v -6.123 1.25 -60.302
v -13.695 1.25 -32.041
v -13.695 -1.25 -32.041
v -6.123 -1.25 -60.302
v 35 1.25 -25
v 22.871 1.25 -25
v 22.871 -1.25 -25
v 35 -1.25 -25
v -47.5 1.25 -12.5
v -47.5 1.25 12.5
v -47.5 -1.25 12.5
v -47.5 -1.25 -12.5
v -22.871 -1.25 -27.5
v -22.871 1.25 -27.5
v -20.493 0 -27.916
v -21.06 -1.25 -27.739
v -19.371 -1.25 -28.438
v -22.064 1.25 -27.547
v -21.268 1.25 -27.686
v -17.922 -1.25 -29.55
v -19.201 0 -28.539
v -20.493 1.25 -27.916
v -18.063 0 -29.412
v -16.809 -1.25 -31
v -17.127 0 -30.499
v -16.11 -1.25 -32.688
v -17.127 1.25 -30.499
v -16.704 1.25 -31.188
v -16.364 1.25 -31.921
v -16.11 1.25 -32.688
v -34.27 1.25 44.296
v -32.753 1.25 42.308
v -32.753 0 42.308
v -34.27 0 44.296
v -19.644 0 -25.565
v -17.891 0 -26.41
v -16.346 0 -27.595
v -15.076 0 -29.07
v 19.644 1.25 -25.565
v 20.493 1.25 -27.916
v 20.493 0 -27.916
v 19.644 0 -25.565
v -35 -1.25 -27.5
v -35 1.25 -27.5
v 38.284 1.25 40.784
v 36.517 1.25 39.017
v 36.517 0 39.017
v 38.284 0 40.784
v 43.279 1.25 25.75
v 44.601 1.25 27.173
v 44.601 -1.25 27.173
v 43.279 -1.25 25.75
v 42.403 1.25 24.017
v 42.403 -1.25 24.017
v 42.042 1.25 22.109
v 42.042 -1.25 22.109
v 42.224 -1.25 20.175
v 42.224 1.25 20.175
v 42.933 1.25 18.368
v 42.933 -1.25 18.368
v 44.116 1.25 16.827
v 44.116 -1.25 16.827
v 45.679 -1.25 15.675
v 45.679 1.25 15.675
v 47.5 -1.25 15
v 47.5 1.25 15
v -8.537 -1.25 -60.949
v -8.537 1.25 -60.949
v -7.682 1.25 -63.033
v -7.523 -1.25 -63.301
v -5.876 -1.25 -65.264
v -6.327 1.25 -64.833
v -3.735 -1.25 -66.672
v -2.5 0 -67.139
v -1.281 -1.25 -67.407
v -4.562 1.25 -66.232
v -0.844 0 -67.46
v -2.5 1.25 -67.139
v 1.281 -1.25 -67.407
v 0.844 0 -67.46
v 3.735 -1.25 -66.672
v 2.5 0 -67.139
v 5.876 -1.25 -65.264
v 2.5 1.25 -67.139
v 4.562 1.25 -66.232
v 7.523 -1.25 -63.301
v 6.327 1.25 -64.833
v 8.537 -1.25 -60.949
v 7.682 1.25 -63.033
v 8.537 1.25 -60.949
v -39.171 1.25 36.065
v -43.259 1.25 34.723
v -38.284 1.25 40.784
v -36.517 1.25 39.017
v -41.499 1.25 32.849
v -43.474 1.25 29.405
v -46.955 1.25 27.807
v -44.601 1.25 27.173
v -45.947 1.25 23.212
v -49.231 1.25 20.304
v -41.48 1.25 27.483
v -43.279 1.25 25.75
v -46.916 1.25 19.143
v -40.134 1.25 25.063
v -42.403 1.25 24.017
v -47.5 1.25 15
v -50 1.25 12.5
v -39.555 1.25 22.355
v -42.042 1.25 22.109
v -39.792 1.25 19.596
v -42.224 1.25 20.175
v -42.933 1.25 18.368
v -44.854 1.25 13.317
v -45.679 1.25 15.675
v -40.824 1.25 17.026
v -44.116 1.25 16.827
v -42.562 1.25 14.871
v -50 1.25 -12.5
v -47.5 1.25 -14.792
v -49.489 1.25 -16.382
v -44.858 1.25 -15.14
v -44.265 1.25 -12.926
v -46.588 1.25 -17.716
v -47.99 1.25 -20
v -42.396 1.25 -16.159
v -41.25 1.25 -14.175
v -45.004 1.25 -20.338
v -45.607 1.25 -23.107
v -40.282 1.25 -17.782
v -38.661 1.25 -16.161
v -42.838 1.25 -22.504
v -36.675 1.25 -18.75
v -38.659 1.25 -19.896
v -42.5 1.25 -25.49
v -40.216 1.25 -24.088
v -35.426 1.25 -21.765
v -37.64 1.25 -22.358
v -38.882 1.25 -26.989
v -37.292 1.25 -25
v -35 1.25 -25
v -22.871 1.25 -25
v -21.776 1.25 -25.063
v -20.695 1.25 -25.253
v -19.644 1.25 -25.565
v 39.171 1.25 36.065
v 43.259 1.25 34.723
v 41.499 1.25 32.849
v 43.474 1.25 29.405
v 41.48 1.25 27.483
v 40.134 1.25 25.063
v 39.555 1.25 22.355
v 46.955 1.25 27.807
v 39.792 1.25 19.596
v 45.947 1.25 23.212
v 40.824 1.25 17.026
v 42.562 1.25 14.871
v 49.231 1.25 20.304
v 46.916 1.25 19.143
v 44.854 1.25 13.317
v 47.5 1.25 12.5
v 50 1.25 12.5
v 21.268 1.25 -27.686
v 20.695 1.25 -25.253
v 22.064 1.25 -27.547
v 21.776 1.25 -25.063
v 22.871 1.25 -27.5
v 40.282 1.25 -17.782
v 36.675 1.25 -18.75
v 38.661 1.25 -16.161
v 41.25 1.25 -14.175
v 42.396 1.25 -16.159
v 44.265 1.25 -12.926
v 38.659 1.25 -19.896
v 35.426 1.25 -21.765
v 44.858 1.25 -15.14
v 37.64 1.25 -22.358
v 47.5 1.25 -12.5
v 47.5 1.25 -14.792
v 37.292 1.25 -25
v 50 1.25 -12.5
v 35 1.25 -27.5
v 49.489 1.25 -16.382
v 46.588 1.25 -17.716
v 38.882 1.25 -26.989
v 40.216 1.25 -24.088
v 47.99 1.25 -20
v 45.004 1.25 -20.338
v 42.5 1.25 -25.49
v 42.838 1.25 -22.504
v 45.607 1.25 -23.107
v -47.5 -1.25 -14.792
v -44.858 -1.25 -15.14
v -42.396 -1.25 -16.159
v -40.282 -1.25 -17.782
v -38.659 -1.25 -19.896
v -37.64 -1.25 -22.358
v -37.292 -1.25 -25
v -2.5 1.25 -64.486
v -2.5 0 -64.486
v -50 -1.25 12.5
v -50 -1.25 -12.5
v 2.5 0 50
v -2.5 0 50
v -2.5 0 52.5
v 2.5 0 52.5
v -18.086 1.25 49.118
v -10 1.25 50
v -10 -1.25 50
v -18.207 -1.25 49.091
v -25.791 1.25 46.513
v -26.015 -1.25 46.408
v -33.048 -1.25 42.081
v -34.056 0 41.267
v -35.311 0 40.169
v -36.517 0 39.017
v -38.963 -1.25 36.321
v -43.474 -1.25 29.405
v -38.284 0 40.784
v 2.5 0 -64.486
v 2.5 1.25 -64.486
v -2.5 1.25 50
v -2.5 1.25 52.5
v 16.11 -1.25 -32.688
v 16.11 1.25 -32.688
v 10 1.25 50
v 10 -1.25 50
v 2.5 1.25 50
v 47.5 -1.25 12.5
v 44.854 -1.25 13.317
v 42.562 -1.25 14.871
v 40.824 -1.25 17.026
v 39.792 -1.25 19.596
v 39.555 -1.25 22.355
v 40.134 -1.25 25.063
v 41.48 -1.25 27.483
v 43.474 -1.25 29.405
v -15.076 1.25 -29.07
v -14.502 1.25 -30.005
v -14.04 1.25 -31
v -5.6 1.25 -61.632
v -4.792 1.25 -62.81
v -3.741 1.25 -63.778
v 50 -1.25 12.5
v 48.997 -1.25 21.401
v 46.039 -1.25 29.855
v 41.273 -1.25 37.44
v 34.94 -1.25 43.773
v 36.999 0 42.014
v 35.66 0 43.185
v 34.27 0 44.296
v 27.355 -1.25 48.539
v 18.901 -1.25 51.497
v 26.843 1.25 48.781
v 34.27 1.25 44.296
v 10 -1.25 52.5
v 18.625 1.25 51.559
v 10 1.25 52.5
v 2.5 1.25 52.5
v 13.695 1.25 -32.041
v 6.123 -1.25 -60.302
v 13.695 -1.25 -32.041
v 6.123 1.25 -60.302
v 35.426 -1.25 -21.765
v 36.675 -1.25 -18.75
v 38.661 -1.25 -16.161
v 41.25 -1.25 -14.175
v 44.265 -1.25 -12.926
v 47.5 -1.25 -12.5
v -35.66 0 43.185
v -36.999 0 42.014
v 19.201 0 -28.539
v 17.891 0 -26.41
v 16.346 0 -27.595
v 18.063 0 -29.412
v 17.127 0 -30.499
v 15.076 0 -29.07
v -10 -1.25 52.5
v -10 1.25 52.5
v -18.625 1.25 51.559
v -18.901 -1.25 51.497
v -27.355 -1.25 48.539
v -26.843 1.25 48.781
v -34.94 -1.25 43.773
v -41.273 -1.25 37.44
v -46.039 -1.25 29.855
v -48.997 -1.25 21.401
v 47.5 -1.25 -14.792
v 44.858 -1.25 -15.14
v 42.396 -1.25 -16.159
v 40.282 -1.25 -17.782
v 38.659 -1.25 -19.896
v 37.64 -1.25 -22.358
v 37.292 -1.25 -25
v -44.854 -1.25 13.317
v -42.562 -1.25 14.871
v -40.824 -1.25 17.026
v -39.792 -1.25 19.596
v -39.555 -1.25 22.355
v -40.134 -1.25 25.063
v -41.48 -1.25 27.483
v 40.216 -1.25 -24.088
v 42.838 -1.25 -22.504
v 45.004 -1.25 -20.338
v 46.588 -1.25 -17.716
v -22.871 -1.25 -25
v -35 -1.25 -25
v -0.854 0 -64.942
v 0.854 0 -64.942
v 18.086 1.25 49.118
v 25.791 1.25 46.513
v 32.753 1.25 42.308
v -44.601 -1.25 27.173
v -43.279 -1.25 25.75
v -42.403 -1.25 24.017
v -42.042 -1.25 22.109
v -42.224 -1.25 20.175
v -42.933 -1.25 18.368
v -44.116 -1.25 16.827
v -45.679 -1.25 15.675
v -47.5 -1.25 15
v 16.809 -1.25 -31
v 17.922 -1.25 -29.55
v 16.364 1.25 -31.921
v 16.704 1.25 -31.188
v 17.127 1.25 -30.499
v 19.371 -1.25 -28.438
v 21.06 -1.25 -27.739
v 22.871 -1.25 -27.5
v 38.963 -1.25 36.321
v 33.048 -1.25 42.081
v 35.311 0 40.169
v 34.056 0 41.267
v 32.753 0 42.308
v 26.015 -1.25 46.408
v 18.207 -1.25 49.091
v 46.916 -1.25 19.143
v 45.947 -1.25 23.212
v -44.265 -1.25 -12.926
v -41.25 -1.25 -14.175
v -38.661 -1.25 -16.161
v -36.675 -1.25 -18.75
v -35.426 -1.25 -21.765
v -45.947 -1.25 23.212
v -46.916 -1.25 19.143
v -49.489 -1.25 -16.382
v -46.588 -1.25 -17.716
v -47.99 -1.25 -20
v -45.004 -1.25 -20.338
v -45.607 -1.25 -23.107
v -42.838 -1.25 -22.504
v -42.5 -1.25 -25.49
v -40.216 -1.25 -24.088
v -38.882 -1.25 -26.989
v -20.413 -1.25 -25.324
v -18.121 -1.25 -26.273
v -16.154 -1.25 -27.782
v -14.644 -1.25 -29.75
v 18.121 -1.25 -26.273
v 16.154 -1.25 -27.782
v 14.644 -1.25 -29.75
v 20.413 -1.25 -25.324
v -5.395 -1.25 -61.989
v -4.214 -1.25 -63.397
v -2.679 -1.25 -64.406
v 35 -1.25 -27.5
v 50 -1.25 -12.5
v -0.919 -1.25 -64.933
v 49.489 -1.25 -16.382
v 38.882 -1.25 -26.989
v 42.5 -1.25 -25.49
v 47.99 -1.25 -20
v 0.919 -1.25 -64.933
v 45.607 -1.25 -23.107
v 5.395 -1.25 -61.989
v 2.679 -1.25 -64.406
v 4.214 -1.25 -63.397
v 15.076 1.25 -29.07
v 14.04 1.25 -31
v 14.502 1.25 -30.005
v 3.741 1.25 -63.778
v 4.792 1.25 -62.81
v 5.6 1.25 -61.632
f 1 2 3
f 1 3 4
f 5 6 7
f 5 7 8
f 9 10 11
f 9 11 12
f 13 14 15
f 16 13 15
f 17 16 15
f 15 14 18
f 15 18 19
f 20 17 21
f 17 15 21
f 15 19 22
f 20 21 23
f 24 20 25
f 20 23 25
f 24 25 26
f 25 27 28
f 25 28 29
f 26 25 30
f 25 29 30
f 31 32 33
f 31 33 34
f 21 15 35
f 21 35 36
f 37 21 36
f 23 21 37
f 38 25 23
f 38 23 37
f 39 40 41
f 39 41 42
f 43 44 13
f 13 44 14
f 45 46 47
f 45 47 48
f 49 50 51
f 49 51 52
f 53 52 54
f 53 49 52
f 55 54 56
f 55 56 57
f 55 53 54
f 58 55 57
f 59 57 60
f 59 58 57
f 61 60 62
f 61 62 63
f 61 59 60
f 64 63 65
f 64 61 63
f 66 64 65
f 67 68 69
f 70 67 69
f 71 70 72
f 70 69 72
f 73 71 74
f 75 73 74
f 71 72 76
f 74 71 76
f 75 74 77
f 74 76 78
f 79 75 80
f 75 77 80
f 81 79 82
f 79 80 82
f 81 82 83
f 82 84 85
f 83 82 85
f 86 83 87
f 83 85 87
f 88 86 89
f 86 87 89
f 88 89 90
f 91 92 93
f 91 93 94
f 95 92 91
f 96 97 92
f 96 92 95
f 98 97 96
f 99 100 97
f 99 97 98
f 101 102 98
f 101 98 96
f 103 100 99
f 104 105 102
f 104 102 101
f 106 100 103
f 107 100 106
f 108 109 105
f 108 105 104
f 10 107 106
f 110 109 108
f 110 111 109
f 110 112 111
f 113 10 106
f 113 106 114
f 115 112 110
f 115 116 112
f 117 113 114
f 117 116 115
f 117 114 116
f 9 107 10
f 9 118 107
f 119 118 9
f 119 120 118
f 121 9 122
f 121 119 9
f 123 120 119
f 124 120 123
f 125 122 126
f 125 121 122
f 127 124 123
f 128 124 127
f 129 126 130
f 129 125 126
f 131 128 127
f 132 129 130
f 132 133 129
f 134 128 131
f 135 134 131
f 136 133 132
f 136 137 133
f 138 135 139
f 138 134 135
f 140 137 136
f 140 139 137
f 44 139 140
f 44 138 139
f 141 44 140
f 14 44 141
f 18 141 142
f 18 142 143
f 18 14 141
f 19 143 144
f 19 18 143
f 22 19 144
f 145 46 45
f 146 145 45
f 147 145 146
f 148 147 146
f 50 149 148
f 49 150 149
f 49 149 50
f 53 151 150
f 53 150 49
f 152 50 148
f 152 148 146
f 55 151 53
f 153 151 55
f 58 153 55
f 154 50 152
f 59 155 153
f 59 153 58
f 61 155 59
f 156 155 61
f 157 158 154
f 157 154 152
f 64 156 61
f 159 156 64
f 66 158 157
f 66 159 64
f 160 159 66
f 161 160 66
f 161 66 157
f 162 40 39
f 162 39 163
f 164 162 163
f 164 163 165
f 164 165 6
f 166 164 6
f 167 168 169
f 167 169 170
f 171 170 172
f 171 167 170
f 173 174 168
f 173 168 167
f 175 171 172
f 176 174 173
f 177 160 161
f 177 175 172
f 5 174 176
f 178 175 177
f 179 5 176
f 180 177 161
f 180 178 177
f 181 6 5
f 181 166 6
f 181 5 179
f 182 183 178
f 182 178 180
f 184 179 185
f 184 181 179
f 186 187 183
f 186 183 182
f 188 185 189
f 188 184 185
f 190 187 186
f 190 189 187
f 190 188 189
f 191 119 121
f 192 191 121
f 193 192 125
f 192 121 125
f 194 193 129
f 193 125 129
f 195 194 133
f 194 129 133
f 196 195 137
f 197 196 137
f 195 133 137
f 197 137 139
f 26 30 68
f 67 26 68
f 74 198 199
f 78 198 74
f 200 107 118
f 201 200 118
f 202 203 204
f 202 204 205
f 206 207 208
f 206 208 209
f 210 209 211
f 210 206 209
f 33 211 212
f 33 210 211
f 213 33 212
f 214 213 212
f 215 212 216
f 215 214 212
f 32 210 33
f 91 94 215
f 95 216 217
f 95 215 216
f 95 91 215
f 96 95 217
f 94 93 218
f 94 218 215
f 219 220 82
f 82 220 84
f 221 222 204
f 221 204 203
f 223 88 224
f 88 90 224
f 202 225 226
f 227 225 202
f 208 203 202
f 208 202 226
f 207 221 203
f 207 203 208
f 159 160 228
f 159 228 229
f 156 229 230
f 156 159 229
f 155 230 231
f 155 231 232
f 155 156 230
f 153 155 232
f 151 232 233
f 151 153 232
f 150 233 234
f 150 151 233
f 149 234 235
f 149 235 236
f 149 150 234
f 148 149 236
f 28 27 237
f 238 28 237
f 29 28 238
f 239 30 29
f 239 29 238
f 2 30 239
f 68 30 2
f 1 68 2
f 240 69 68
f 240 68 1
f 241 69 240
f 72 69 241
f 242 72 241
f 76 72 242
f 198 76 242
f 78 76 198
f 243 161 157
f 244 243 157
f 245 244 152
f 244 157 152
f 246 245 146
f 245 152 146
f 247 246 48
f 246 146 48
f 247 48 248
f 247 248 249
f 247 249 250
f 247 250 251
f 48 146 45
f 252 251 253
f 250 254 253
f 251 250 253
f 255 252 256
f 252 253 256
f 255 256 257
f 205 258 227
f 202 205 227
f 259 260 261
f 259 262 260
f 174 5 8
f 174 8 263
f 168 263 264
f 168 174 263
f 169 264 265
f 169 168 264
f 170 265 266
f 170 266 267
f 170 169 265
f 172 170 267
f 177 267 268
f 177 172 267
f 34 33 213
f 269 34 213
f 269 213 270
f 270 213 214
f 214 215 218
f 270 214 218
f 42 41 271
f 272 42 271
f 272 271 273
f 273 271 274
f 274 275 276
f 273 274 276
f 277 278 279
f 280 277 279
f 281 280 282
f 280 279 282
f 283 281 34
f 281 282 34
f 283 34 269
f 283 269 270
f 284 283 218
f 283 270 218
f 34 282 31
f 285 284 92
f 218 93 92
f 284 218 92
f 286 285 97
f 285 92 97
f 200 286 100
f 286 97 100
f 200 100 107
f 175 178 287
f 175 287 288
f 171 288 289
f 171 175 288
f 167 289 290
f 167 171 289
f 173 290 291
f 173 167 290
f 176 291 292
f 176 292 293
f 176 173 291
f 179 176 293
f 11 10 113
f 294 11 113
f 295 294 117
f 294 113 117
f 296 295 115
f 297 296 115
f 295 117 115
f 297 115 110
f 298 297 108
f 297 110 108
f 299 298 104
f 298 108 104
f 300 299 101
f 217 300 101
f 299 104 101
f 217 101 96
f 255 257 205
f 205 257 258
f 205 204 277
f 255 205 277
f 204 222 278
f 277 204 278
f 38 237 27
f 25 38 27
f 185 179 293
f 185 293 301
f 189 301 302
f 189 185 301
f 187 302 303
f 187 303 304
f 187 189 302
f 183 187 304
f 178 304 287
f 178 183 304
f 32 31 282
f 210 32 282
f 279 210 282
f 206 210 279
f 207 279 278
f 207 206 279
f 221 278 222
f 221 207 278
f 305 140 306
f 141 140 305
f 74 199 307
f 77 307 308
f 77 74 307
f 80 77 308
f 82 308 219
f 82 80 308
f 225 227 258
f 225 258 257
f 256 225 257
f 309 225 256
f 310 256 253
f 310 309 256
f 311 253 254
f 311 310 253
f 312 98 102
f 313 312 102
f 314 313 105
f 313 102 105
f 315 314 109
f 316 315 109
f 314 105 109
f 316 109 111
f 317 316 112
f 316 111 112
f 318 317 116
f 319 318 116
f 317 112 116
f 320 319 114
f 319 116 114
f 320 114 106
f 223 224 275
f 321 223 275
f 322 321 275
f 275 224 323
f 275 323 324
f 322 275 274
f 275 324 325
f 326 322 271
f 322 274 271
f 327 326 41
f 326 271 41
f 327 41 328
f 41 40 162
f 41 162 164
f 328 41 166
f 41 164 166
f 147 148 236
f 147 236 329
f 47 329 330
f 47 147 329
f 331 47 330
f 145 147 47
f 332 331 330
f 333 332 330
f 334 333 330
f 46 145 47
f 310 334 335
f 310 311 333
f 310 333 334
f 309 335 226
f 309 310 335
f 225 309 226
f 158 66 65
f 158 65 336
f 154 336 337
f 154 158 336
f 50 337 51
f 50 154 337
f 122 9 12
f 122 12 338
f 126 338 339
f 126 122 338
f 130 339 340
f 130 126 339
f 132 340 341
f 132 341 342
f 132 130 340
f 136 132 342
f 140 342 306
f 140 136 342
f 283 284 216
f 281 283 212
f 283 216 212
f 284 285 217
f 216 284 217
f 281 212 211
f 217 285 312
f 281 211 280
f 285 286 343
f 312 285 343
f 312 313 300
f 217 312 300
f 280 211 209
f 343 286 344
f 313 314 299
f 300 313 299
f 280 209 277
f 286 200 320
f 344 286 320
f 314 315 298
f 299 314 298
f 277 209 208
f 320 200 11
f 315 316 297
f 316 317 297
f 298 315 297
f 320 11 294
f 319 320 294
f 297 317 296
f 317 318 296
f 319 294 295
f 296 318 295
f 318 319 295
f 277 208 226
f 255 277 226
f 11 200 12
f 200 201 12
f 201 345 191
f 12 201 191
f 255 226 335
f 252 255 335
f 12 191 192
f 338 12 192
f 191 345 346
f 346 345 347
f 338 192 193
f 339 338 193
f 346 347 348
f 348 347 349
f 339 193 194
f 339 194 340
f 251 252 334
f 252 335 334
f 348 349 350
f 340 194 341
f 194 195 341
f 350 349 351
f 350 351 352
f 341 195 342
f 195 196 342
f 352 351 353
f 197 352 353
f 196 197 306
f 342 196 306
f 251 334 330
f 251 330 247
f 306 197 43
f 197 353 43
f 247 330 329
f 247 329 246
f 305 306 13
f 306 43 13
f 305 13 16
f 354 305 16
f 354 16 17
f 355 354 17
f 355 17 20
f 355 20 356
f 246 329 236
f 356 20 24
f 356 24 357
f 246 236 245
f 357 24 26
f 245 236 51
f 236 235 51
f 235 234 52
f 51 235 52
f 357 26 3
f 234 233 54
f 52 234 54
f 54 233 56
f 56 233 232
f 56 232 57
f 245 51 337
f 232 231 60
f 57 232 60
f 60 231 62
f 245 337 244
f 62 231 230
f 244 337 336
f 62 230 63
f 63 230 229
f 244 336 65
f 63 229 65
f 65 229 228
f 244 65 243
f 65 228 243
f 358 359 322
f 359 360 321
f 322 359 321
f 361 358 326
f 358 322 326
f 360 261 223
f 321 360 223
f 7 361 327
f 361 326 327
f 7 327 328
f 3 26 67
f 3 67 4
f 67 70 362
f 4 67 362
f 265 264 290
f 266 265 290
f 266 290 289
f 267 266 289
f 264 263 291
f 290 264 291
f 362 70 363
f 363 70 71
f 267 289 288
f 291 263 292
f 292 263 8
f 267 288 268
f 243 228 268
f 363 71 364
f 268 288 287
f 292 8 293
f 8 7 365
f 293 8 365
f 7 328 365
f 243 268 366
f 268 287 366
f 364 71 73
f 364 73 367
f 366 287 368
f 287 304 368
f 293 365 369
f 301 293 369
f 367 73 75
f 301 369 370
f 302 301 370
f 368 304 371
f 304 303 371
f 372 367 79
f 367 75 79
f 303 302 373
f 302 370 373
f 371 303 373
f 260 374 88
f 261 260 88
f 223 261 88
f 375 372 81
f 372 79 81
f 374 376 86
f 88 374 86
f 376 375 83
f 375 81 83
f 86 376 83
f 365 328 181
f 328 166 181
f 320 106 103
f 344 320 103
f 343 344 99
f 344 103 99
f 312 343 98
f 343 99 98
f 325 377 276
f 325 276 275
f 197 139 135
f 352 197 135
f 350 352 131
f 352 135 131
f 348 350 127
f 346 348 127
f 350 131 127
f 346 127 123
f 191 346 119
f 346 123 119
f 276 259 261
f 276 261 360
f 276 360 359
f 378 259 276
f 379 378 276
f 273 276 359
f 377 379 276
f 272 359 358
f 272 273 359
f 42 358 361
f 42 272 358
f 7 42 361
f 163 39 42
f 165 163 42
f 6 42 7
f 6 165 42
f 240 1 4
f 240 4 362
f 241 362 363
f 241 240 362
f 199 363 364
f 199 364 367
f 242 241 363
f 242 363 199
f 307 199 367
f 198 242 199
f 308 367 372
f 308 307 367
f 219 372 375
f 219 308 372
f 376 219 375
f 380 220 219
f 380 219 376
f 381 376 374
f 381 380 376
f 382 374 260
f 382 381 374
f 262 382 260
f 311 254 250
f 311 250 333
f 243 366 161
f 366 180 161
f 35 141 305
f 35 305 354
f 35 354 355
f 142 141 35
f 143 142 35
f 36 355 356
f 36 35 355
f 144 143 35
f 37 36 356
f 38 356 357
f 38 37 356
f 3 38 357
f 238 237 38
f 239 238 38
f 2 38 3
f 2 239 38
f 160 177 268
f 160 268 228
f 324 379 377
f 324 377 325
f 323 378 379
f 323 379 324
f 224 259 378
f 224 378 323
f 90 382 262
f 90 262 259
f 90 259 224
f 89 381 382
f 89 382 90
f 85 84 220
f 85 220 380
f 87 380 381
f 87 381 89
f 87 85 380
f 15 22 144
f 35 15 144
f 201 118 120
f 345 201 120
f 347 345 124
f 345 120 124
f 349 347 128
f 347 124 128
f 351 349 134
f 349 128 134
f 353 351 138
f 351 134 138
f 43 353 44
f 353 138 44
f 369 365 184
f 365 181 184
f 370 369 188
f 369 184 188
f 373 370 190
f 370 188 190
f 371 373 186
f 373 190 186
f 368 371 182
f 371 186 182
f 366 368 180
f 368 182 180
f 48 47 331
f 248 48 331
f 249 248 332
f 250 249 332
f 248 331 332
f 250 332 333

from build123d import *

# Parameters (mm, degrees)
BOSS_EXTRUDE1_DEPTH = 1.25
BOSS_EXTRUDE5_DEPTH = 2.5
SKETCH6_W           = 5
SKETCH6_H           = 4
CUT_EXTRUDE1_DEPTH  = 1.25
CUT_EXTRUDE2_DEPTH  = 2.5


with BuildPart() as part:
    # Sketch2 → Boss-Extrude1 (new body, symmetric)
    with BuildSketch(Plane(origin=(0, 0, 0), x_dir=(1, 0, 0), z_dir=(0, 1, 0))):
        with BuildLine():
            Line((-16.109808132, 32.688266684), (-8.537351427, 60.949059844))
            ThreePointArc((-8.537351427, 60.949059844), (0, 67.5), (8.537351427, 60.949059844))
            Line((8.537351427, 60.949059844), (16.109808132, 32.688266684))
            ThreePointArc((16.109808132, 32.688266684), (18.609958913, 28.946526618), (22.871288916, 27.5))
            Line((22.871288916, 27.5), (35, 27.5))
            ThreePointArc((35, 27.5), (45.606601718, 23.106601718), (50, 12.5))
            Line((50, 12.5), (50, -12.5))
            ThreePointArc((50, -12.5), (38.284271247, -40.784271247), (10, -52.5))
            Line((10, -52.5), (-10, -52.5))
            ThreePointArc((-10, -52.5), (-38.284271247, -40.784271247), (-50, -12.5))
            Line((-50, -12.5), (-50, 12.5))
            ThreePointArc((-50, 12.5), (-45.606601718, 23.106601718), (-35, 27.5))
            Line((-35, 27.5), (-22.871288916, 27.5))
            ThreePointArc((-22.871288916, 27.5), (-18.609958913, 28.946526618), (-16.109808132, 32.688266684))
        make_face()
        with BuildLine():
            Line((6.122536861, 60.302012231), (13.694993566, 32.041219072))
            ThreePointArc((13.694993566, 32.041219072), (17.08805534, 26.963143267), (22.871288916, 25))
            Line((22.871288916, 25), (35, 25))
            ThreePointArc((35, 25), (43.838834765, 21.338834765), (47.5, 12.5))
            Line((47.5, 12.5), (47.5, -12.5))
            ThreePointArc((47.5, -12.5), (36.516504294, -39.016504294), (10, -50))
            Line((10, -50), (-10, -50))
            ThreePointArc((-10, -50), (-36.516504294, -39.016504294), (-47.5, -12.5))
            Line((-47.5, -12.5), (-47.5, 12.5))
            ThreePointArc((-47.5, 12.5), (-43.838834765, 21.338834765), (-35, 25))
            Line((-35, 25), (-22.871288916, 25))
            ThreePointArc((-22.871288916, 25), (-17.08805534, 26.963143267), (-13.694993566, 32.041219072))
            Line((-13.694993566, 32.041219072), (-6.122536861, 60.302012231))
            ThreePointArc((-6.122536861, 60.302012231), (0, 65), (6.122536861, 60.302012231))
        make_face(mode=Mode.SUBTRACT)
    extrude(amount=BOSS_EXTRUDE1_DEPTH, both=True)

    # Sketch5 → Boss-Extrude5 (add)
    with BuildSketch(Plane(origin=(0, 1.25, 0), x_dir=(1, 0, 0), z_dir=(0, 1, 0))):
        with BuildLine():
            ThreePointArc((-47.5, 12.5), (-38.661165235, 16.161165235), (-35, 25))
            ThreePointArc((-35, 25), (-43.838834765, 21.338834765), (-47.5, 12.5))
        make_face()
        with BuildLine():
            ThreePointArc((35, 25), (38.661165235, 16.161165235), (47.5, 12.5))
            ThreePointArc((47.5, 12.5), (43.838834765, 21.338834765), (35, 25))
        make_face()
        with BuildLine():
            ThreePointArc((-47.5, -12.5), (-39.791585286, -19.595919329), (-43.473512014, -29.404851181))
            ThreePointArc((-43.473512014, -29.404851181), (-46.479492188, -21.188880811), (-47.5, -12.5))
        make_face()
        with BuildLine():
            ThreePointArc((47.5, -12.5), (39.791585286, -19.595919329), (43.473512014, -29.404851181))
            ThreePointArc((43.473512014, -29.404851181), (46.479492188, -21.188880811), (47.5, -12.5))
        make_face()
    extrude(amount=-BOSS_EXTRUDE5_DEPTH)

    # Sketch6 → Cut-Extrude1 (cut)
    with BuildSketch(Plane(origin=(0, 1.25, 0), x_dir=(1, 0, 0), z_dir=(0, 1, 0))):
        with Locations((0, 66.25)):
            Rectangle(SKETCH6_W, SKETCH6_H)
        with BuildLine():
            Line((-20.493193447, 27.916333701), (-19.643873637, 25.565024308))
            ThreePointArc((-19.643873637, 25.565024308), (-17.08805534, 26.963143267), (-15.076081678, 29.070014354))
            Line((-15.076081678, 29.070014354), (-17.127452004, 30.498957945))
            ThreePointArc((-17.127452004, 30.498957945), (-18.609958913, 28.946526618), (-20.493193447, 27.916333701))
        make_face()
        with BuildLine():
            Line((20.493193447, 27.916333701), (19.643873637, 25.565024308))
            ThreePointArc((19.643873637, 25.565024308), (17.08805534, 26.963143267), (15.076081678, 29.070014354))
            Line((15.076081678, 29.070014354), (17.127452004, 30.498957945))
            ThreePointArc((17.127452004, 30.498957945), (18.609958913, 28.946526618), (20.493193447, 27.916333701))
        make_face()
        with BuildLine():
            Line((-38.284271247, -40.784271247), (-36.516504294, -39.016504294))
            ThreePointArc((-36.516504294, -39.016504294), (-34.689746158, -40.725280064), (-32.753133619, -42.308470449))
            Line((-32.753133619, -42.308470449), (-34.270009194, -44.295701812))
            ThreePointArc((-34.270009194, -44.295701812), (-36.335729235, -42.606965401), (-38.284271247, -40.784271247))
        make_face()
        with BuildLine():
            Line((34.270009194, -44.295701812), (32.753133619, -42.308470449))
            ThreePointArc((32.753133619, -42.308470449), (34.689746158, -40.725280064), (36.516504294, -39.016504294))
            Line((36.516504294, -39.016504294), (38.284271247, -40.784271247))
            ThreePointArc((38.284271247, -40.784271247), (36.335729235, -42.606965401), (34.270009194, -44.295701812))
        make_face()
        with Locations((0, -51.5)):
            Rectangle(SKETCH6_W, SKETCH6_H)
    extrude(amount=-CUT_EXTRUDE1_DEPTH, mode=Mode.SUBTRACT)

    # Sketch7 → Cut-Extrude2 (cut)
    with BuildSketch(Plane(origin=(0, 1.25, 0), x_dir=(1, 0, 0), z_dir=(0, 1, 0))):
        with BuildLine():
            ThreePointArc((-47.5, 14.791666667), (-40.281618275, 17.781618275), (-37.291666667, 25))
            ThreePointArc((-37.291666667, 25), (-43.986148678, 21.486148678), (-47.5, 14.791666667))
        make_face()
        with BuildLine():
            ThreePointArc((37.291666667, 25), (43.986148678, 21.486148678), (47.5, 14.791666667))
            ThreePointArc((47.5, 14.791666667), (40.281618275, 17.781618275), (37.291666667, 25))
        make_face()
        with BuildLine():
            ThreePointArc((-44.600502093, -27.173283714), (-42.223551432, -20.175178049), (-47.5, -15))
            ThreePointArc((-47.5, -15), (-46.479492187, -21.188880811), (-44.600502093, -27.173283714))
        make_face()
        with BuildLine():
            ThreePointArc((47.5, -15), (46.479492187, -21.188880811), (44.600502093, -27.173283714))
            ThreePointArc((44.600502093, -27.173283714), (42.223551432, -20.175178049), (47.5, -15))
        make_face()
    extrude(amount=-CUT_EXTRUDE2_DEPTH, mode=Mode.SUBTRACT)


solid = part.part
